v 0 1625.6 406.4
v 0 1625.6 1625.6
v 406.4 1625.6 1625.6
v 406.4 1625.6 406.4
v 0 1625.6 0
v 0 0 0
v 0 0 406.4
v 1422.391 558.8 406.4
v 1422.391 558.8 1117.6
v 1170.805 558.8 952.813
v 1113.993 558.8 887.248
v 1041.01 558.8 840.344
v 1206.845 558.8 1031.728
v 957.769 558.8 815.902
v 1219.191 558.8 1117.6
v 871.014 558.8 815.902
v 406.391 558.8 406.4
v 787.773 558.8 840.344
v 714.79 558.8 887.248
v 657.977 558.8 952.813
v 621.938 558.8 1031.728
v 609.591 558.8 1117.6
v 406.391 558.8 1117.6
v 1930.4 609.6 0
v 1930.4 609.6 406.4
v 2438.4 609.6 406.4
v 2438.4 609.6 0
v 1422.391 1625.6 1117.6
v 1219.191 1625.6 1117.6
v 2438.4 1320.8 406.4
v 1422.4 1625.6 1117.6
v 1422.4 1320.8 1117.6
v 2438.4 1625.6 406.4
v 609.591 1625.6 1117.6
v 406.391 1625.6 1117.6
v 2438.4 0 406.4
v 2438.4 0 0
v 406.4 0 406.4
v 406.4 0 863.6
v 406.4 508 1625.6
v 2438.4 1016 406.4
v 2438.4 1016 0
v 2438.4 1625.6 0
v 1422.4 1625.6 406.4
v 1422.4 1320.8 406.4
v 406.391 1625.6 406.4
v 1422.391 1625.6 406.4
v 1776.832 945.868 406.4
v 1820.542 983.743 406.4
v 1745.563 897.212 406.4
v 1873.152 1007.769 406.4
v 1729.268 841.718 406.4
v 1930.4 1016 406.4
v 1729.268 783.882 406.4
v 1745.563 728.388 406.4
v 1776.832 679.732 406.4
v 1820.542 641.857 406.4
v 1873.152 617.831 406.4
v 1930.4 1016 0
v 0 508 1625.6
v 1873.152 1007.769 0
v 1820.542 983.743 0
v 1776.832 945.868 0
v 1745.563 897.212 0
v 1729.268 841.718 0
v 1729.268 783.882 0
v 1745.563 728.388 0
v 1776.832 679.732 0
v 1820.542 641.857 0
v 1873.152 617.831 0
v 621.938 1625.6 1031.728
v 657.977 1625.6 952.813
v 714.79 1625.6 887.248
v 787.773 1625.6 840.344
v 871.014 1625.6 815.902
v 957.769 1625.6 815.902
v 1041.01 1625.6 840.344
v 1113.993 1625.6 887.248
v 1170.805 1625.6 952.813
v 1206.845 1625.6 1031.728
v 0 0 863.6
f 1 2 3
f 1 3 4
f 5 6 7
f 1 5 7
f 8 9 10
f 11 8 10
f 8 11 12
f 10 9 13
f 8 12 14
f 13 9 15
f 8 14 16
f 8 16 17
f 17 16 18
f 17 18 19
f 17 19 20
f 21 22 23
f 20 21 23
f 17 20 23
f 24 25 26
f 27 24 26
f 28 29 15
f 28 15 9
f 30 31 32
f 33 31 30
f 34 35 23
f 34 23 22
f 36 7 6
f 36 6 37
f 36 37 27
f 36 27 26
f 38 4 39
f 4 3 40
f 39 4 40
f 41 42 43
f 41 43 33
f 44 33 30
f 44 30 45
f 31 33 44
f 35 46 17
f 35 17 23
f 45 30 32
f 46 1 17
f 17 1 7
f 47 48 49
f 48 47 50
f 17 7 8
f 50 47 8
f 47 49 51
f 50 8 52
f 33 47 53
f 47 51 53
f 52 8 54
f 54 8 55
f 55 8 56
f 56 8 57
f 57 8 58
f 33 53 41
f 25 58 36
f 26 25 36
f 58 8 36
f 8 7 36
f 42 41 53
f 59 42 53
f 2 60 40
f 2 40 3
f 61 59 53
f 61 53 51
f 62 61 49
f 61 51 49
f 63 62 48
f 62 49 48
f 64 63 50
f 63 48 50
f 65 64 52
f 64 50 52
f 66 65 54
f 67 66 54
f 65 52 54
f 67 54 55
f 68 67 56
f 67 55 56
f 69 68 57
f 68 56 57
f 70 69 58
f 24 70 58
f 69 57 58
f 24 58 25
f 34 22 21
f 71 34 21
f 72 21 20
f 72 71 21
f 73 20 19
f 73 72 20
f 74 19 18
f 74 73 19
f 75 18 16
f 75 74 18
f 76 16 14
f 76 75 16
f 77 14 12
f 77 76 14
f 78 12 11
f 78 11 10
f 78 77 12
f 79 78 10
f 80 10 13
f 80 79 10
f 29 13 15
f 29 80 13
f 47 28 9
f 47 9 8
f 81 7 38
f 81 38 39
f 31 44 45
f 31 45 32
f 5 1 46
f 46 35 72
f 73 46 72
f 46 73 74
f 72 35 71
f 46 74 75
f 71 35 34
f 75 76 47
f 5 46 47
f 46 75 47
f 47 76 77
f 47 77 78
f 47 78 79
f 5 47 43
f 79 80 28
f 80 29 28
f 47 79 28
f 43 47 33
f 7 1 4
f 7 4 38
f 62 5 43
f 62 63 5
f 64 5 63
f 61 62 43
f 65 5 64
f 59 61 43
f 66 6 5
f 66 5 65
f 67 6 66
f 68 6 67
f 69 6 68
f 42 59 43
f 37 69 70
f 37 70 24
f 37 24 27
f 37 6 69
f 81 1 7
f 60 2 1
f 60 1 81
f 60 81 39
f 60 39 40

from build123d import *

# Parameters (mm, degrees)
F0_W     = 2438.4
F0_H     = 406.4
F1_DEPTH = 1625.6
F3_DEPTH = 304.8
F5_DEPTH = 406.4
F8_DEPTH = 1066.8
F9_DEPTH = 406.4


with BuildPart() as f1:
    # F0 (on Front) → F1 (new body)
    with BuildSketch(Plane.XZ):
        with Locations((1219.2, 203.2)):
            Rectangle(F0_W, F0_H)
    extrude(amount=-F1_DEPTH)

    # F4 (on face) → F5 (cut)
    with BuildSketch(Plane.XY.offset(406.4)):
        with BuildLine():
            Line((1930.4, 609.6), (2438.4, 609.6))
            Line((2438.4, 609.6), (2438.4, 1016))
            Line((2438.4, 1016), (1930.4, 1016))
            ThreePointArc((1930.4, 1016), (1727.2, 812.8), (1930.4, 609.6))
        make_face()
    extrude(amount=-F5_DEPTH, mode=Mode.SUBTRACT)

    # F7 (on face) → F8 (join)
    with BuildSketch(Plane(origin=(0, 1625.6, 0), x_dir=(-1, 0, 0), z_dir=(0, 1, 0))):
        with BuildLine():
            Line((-1422.391415, 1117.6), (-1422.391415, 406.4))
            Line((-1422.391415, 406.4), (-406.391415, 406.4))
            Line((-406.391415, 406.4), (-406.391415, 1117.6))
            Line((-406.391415, 1117.6), (-609.591415, 1117.6))
            ThreePointArc((-609.591415, 1117.6), (-914.391415, 812.8), (-1219.191415, 1117.6))
            Line((-1219.191415, 1117.6), (-1422.391415, 1117.6))
        make_face()
    extrude(amount=-F8_DEPTH)


with BuildPart() as f3:
    # F2 (on face) → F3 (new body)
    with BuildSketch(Plane(origin=(0, 1625.6, 0), x_dir=(-1, 0, 0), z_dir=(0, 1, 0))):
        Polygon((-1422.4, 1117.6), (-2438.4, 406.4), (-1422.4, 406.4), align=None)
    extrude(amount=-F3_DEPTH)


with BuildPart() as f9:
    # F6 (on face) → F9 (new body)
    with BuildSketch(Plane(origin=(0, 0, 0), x_dir=(0, -1, 0), z_dir=(-1, 0, 0))):
        Polygon((-1625.6, 1625.6), (-1625.6, 406.4), (0, 406.4), (0, 863.6), (-508, 1625.6), align=None)
    extrude(amount=-F9_DEPTH)


solid = Compound([f1.part, f3.part, f9.part])
